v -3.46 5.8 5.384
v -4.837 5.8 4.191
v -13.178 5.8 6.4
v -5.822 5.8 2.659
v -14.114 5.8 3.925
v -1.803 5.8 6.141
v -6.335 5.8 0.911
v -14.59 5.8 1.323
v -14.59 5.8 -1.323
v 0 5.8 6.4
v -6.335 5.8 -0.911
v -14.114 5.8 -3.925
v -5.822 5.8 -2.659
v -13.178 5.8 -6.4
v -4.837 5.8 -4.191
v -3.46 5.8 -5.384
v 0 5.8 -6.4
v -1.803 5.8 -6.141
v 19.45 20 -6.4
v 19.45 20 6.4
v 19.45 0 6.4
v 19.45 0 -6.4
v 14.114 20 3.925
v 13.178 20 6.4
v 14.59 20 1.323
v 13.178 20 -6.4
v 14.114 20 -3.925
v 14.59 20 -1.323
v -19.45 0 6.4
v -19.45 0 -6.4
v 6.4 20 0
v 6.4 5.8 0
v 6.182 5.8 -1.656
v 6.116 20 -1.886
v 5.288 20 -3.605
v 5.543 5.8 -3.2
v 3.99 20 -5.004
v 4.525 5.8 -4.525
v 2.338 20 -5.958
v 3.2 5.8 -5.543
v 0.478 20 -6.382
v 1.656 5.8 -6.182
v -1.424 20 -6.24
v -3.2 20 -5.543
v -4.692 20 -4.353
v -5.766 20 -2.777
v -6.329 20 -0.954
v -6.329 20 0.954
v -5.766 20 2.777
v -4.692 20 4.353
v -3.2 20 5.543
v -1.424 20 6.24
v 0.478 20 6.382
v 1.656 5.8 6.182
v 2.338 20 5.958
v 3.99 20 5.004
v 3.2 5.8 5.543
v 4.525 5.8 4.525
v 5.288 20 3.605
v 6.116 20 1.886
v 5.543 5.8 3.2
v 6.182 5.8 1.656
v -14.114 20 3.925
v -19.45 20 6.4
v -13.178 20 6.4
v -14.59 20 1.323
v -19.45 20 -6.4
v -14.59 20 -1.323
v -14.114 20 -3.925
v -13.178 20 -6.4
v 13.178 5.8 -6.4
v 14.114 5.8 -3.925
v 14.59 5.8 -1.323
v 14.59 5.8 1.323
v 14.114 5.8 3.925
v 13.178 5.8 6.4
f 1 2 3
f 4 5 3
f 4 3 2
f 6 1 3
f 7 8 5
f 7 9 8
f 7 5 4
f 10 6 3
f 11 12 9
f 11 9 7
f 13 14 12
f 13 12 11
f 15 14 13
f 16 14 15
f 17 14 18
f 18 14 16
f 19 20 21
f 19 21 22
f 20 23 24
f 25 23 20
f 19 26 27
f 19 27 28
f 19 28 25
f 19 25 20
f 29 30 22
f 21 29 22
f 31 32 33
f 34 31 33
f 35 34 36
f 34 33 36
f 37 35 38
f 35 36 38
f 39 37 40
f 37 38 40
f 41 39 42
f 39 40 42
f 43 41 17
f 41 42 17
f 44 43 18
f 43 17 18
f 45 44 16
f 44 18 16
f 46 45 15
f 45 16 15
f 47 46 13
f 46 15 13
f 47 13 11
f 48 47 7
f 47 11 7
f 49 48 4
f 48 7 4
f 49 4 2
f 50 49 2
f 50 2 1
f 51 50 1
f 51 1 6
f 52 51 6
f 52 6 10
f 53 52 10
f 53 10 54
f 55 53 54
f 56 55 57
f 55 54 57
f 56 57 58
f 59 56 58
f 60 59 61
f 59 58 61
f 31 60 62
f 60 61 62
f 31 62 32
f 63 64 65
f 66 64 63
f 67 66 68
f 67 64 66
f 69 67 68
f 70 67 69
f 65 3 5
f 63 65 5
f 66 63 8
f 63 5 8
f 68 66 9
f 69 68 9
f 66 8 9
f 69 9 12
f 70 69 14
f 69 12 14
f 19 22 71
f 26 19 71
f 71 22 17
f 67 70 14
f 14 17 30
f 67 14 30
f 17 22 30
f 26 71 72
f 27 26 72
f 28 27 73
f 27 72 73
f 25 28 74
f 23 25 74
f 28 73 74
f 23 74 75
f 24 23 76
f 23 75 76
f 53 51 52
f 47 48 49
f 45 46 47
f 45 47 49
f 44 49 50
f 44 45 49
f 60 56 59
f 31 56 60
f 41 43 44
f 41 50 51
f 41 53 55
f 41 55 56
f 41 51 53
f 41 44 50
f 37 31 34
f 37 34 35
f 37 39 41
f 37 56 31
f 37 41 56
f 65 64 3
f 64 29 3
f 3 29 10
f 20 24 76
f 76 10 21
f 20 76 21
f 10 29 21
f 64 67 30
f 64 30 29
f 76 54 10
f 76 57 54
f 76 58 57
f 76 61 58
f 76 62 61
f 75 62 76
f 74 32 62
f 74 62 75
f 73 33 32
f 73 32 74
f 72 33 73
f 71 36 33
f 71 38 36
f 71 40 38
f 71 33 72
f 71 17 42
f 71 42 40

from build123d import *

# Parameters (mm, degrees)
SKETCH2_W           = 38.9
SKETCH2_H           = 12.8
BOSS_EXTRUDE1_DEPTH = 5.8
SKETCH3_R           = 6.4
BOSS_EXTRUDE2_DEPTH = 14.2


with BuildPart() as part:
    # Sketch2 → Boss-Extrude1 (new body)
    with BuildSketch(Plane(origin=(0, 0, 0), x_dir=(1, 0, 0), z_dir=(0, 1, 0))):
        Rectangle(SKETCH2_W, SKETCH2_H)
    extrude(amount=BOSS_EXTRUDE1_DEPTH)

    # Sketch3 → Boss-Extrude2 (add)
    with BuildSketch(Plane(origin=(0, 5.8, 0), x_dir=(1, 0, 0), z_dir=(0, 1, 0))):
        with BuildLine():
            Line((-13.178106844, 6.4), (-19.45, 6.4))
            Line((-19.45, 6.4), (-19.45, -6.4))
            Line((-19.45, -6.4), (-13.178106844, -6.4))
            ThreePointArc((-13.178106844, -6.4), (-14.65, 0), (-13.178106844, 6.4))
        make_face()
        Circle(SKETCH3_R)
        with BuildLine():
            Line((19.45, 6.4), (13.178106844, 6.4))
            ThreePointArc((13.178106844, 6.4), (14.65, 0), (13.178106844, -6.4))
            Line((13.178106844, -6.4), (19.45, -6.4))
            Line((19.45, -6.4), (19.45, 6.4))
        make_face()
    extrude(amount=BOSS_EXTRUDE2_DEPTH)


solid = part.part
